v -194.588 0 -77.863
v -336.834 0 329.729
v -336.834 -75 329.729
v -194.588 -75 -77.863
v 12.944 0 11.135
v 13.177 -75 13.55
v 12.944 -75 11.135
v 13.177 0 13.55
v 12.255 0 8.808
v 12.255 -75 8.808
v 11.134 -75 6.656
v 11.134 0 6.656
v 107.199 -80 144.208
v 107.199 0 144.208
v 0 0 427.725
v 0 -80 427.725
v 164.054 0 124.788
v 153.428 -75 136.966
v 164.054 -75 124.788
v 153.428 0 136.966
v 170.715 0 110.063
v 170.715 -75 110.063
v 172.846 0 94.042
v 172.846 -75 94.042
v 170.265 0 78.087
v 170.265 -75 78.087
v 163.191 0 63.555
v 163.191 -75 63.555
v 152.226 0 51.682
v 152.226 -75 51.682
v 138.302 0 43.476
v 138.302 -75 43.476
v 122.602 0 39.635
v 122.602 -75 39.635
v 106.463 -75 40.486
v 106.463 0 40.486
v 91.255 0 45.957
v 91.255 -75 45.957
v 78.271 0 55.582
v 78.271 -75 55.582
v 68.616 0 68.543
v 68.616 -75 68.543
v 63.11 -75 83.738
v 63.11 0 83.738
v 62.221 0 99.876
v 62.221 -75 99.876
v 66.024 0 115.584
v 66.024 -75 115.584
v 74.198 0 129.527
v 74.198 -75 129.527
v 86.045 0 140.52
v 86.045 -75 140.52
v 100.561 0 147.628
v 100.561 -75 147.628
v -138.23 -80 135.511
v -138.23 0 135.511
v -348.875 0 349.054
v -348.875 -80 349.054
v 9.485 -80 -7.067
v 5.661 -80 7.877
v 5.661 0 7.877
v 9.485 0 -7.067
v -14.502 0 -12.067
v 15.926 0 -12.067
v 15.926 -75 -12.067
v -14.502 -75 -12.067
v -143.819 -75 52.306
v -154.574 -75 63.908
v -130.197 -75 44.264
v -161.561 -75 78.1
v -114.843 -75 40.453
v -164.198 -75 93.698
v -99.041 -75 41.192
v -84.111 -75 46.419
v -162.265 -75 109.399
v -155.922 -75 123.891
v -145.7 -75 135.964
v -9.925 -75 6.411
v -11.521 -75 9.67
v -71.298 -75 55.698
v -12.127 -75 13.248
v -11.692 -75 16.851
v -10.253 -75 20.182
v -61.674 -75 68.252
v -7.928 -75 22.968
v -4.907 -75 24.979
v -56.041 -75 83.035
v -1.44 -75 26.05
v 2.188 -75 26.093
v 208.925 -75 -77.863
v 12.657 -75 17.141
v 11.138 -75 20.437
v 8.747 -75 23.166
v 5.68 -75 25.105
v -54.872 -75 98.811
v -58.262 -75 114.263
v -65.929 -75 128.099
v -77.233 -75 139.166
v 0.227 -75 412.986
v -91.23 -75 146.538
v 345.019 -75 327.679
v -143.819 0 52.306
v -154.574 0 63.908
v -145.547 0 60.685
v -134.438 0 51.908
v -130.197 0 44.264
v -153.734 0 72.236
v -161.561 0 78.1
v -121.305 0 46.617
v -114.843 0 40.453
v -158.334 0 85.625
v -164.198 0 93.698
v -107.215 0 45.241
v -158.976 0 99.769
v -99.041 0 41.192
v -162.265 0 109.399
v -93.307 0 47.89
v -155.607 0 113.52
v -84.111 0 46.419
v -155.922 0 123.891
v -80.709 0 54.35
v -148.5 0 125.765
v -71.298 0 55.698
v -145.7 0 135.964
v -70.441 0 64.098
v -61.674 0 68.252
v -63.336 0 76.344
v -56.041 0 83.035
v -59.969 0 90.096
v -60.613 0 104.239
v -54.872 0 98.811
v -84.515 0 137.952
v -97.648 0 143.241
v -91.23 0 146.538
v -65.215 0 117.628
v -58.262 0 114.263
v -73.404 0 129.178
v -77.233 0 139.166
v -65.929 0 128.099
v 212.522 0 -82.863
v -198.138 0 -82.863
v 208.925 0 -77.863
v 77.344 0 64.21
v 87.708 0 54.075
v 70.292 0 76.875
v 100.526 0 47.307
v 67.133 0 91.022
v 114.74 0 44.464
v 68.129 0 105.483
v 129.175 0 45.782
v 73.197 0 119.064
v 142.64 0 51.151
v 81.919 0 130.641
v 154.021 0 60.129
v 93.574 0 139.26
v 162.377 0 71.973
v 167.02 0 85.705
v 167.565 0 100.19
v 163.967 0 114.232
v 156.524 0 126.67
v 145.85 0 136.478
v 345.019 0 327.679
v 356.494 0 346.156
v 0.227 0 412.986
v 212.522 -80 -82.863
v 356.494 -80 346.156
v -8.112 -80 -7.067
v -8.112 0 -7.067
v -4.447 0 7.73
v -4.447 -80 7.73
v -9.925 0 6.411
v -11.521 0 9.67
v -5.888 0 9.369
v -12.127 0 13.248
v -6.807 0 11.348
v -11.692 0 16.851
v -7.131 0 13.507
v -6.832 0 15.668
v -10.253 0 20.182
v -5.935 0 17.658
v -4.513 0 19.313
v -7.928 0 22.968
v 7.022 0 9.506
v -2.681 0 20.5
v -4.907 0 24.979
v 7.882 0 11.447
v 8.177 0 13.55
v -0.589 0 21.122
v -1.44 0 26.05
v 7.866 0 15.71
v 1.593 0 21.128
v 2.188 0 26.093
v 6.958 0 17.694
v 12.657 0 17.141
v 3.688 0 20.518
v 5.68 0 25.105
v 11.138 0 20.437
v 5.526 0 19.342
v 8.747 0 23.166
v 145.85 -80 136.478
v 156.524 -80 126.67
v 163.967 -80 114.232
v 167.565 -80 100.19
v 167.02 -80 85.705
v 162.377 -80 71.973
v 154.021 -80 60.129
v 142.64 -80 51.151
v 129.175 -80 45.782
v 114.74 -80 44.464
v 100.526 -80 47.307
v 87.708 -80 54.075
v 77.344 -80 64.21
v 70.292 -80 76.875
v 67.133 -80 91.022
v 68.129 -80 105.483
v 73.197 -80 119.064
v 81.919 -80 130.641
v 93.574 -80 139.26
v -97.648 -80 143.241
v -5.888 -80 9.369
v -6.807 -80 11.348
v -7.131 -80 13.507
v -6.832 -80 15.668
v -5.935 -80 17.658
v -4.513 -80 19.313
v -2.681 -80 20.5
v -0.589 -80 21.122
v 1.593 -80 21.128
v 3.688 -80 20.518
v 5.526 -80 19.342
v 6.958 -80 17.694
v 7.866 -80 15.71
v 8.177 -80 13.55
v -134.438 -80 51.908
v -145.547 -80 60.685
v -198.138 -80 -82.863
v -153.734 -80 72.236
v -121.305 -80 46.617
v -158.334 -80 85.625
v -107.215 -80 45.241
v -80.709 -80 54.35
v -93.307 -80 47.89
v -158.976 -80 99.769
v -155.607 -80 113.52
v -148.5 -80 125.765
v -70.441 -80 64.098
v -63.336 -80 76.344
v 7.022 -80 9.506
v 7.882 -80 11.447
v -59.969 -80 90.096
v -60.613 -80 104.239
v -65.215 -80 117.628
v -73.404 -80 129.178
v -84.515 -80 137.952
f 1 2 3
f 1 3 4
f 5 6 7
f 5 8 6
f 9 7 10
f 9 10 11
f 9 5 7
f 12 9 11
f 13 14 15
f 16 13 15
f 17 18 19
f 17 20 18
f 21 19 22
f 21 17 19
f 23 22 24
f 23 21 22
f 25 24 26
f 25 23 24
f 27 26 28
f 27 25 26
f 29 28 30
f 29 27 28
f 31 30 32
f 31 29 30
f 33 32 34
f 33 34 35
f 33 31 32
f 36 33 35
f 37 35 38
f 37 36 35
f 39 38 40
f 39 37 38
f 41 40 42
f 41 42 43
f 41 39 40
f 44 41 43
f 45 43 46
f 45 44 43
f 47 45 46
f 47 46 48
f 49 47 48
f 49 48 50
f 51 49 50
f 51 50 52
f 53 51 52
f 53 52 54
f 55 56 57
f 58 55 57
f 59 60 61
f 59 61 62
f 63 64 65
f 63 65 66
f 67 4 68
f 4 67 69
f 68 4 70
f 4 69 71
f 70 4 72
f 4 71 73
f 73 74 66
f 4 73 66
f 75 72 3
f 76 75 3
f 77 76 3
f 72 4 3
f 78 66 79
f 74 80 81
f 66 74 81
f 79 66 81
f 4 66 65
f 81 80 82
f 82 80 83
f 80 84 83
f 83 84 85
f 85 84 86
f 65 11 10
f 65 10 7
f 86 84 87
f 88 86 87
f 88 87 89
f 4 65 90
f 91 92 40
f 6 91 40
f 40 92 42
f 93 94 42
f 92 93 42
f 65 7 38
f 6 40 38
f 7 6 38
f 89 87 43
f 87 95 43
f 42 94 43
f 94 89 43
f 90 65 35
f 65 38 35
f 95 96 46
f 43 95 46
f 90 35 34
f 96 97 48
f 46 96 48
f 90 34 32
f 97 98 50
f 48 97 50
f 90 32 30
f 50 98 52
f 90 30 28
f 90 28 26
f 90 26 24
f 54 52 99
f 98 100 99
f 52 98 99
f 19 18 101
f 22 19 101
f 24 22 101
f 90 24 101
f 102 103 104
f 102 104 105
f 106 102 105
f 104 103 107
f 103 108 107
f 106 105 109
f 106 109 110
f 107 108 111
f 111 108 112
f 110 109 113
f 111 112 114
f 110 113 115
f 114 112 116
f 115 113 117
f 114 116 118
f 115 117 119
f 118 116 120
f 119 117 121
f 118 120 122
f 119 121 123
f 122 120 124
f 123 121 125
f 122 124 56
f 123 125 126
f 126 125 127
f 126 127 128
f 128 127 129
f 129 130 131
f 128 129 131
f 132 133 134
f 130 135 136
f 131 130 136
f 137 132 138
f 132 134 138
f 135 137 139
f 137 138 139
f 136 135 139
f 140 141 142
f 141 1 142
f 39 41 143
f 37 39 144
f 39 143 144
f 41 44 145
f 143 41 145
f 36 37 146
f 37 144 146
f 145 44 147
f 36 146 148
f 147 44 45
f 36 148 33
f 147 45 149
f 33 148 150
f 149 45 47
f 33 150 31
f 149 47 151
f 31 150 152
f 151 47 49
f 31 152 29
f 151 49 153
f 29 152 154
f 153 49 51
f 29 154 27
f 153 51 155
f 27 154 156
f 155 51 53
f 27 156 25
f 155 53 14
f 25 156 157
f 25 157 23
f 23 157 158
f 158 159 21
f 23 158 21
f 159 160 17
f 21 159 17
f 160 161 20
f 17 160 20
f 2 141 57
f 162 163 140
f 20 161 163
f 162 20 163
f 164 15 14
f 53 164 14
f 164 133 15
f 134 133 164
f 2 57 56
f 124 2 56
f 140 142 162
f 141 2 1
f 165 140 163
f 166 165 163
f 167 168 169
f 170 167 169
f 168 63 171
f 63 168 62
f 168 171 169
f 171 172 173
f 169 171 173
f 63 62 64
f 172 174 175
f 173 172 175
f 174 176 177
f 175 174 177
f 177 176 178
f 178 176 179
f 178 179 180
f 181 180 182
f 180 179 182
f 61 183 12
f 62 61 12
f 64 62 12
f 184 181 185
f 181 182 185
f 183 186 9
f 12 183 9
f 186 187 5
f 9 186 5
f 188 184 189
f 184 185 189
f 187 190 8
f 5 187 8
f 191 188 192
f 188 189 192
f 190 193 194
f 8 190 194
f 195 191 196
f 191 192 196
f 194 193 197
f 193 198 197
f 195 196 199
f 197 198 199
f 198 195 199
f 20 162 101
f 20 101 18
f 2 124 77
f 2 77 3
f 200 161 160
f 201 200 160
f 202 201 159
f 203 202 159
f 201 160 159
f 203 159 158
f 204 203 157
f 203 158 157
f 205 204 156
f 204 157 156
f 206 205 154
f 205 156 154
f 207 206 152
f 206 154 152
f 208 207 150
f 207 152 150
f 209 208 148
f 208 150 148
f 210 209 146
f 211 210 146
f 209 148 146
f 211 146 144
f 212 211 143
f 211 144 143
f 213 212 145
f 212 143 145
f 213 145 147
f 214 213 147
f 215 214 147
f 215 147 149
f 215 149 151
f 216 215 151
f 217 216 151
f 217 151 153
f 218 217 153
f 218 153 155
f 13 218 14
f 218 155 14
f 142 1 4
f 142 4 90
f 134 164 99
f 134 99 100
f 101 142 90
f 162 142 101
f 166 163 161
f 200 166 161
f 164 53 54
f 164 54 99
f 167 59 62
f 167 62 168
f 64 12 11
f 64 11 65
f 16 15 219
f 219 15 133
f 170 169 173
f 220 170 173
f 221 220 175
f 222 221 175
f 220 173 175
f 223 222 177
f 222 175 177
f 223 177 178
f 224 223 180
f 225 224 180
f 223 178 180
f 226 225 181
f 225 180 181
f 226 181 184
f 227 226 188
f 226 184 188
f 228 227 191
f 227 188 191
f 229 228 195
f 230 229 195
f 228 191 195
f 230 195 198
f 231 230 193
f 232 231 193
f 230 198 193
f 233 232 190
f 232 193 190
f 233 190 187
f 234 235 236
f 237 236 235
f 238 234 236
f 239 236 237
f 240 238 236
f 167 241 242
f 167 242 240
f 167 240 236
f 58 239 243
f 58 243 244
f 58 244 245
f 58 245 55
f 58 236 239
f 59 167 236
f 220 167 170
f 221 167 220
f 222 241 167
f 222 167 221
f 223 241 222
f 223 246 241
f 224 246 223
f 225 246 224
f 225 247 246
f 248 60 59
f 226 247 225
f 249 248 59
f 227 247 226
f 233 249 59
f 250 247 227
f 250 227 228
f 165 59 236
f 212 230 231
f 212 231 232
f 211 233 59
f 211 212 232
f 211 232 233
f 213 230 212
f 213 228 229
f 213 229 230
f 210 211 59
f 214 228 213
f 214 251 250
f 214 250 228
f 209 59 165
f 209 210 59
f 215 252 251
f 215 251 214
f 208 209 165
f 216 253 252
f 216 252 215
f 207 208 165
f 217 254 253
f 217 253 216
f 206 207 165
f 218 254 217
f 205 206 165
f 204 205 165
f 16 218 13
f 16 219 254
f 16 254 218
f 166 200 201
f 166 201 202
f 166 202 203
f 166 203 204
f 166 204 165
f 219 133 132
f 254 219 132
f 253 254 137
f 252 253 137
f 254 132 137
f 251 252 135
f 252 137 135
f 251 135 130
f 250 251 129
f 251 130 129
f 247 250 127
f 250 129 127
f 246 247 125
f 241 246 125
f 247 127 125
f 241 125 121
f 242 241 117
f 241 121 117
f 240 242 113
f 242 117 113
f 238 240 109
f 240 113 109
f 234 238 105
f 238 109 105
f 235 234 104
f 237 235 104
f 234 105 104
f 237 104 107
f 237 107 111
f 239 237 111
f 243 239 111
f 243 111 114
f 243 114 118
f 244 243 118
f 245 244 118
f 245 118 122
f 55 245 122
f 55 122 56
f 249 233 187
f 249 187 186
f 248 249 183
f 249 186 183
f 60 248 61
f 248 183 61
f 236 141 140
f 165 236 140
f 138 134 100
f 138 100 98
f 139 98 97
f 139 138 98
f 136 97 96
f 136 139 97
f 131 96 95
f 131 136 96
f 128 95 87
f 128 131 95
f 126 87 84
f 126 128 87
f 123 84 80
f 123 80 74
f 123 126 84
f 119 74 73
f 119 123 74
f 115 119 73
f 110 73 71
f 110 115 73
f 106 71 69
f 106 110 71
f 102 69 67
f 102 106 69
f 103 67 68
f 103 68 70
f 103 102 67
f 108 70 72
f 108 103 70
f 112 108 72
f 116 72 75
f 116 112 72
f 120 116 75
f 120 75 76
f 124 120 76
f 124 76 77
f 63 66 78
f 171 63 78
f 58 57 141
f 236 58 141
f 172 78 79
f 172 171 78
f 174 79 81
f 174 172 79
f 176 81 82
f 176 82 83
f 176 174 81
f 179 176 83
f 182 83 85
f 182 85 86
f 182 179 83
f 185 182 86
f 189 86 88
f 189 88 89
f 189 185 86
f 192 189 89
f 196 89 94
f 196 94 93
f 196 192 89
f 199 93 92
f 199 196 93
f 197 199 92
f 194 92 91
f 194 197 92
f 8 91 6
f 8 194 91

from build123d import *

# Parameters (mm, degrees)
F1_DEPTH = 80
F2_T     = -5


with BuildPart() as f1:
    # F0 (on Front) → F1 (new body)
    with BuildSketch(Plane.XZ):
        with BuildLine():
            Line((-348.8748669624, 349.0544557571), (-198.1384754181, -82.8632265329))
            Line((-198.1384754181, -82.8632265329), (212.5215083361, -82.8632265329))
            Line((212.5215083361, -82.8632265329), (356.4940690994, 346.1556732655))
            Line((356.4940690994, 346.1556732655), (145.8496451378, 136.4775151014))
            ThreePointArc((145.8496451378, 136.4775151014), (107.5303186219, 45.3719417758), (107.1992963552, 144.2075967789))
            Line((107.1992963552, 144.2075967789), (0, 427.7250468731))
            Line((0, 427.7250468731), (-97.6475700736, 143.2413309813))
            ThreePointArc((-97.6475700736, 143.2413309813), (-100.1659657794, 46.0677822233), (-138.2304430008, 135.511264205))
            Line((-138.2304430008, 135.511264205), (-348.8748669624, 349.0544557571))
        make_face()
        with BuildLine():
            ThreePointArc((-4.4474751757, 7.729579965), (-2.6813223644, 20.5003556429), (8.1768609292, 13.5496820978))
            ThreePointArc((8.1768609292, 13.5496820978), (7.5196984972, 10.4468328198), (5.6610608526, 7.8768129348))
            Line((5.6610608526, 7.8768129348), (9.4852344756, -7.0666760483))
            Line((9.4852344756, -7.0666760483), (-8.1122881109, -7.0666760483))
            Line((-8.1122881109, -7.0666760483), (-4.4474751757, 7.729579965))
        make_face(mode=Mode.SUBTRACT)
    extrude(amount=F1_DEPTH)

    # F2
    f2_openings = [f1.faces().sort_by_distance(p)[0] for p in [
        (6.021536, 0, 100.900986),
    ]]
    offset(amount=F2_T, openings=f2_openings, kind=Kind.INTERSECTION)


solid = f1.part
